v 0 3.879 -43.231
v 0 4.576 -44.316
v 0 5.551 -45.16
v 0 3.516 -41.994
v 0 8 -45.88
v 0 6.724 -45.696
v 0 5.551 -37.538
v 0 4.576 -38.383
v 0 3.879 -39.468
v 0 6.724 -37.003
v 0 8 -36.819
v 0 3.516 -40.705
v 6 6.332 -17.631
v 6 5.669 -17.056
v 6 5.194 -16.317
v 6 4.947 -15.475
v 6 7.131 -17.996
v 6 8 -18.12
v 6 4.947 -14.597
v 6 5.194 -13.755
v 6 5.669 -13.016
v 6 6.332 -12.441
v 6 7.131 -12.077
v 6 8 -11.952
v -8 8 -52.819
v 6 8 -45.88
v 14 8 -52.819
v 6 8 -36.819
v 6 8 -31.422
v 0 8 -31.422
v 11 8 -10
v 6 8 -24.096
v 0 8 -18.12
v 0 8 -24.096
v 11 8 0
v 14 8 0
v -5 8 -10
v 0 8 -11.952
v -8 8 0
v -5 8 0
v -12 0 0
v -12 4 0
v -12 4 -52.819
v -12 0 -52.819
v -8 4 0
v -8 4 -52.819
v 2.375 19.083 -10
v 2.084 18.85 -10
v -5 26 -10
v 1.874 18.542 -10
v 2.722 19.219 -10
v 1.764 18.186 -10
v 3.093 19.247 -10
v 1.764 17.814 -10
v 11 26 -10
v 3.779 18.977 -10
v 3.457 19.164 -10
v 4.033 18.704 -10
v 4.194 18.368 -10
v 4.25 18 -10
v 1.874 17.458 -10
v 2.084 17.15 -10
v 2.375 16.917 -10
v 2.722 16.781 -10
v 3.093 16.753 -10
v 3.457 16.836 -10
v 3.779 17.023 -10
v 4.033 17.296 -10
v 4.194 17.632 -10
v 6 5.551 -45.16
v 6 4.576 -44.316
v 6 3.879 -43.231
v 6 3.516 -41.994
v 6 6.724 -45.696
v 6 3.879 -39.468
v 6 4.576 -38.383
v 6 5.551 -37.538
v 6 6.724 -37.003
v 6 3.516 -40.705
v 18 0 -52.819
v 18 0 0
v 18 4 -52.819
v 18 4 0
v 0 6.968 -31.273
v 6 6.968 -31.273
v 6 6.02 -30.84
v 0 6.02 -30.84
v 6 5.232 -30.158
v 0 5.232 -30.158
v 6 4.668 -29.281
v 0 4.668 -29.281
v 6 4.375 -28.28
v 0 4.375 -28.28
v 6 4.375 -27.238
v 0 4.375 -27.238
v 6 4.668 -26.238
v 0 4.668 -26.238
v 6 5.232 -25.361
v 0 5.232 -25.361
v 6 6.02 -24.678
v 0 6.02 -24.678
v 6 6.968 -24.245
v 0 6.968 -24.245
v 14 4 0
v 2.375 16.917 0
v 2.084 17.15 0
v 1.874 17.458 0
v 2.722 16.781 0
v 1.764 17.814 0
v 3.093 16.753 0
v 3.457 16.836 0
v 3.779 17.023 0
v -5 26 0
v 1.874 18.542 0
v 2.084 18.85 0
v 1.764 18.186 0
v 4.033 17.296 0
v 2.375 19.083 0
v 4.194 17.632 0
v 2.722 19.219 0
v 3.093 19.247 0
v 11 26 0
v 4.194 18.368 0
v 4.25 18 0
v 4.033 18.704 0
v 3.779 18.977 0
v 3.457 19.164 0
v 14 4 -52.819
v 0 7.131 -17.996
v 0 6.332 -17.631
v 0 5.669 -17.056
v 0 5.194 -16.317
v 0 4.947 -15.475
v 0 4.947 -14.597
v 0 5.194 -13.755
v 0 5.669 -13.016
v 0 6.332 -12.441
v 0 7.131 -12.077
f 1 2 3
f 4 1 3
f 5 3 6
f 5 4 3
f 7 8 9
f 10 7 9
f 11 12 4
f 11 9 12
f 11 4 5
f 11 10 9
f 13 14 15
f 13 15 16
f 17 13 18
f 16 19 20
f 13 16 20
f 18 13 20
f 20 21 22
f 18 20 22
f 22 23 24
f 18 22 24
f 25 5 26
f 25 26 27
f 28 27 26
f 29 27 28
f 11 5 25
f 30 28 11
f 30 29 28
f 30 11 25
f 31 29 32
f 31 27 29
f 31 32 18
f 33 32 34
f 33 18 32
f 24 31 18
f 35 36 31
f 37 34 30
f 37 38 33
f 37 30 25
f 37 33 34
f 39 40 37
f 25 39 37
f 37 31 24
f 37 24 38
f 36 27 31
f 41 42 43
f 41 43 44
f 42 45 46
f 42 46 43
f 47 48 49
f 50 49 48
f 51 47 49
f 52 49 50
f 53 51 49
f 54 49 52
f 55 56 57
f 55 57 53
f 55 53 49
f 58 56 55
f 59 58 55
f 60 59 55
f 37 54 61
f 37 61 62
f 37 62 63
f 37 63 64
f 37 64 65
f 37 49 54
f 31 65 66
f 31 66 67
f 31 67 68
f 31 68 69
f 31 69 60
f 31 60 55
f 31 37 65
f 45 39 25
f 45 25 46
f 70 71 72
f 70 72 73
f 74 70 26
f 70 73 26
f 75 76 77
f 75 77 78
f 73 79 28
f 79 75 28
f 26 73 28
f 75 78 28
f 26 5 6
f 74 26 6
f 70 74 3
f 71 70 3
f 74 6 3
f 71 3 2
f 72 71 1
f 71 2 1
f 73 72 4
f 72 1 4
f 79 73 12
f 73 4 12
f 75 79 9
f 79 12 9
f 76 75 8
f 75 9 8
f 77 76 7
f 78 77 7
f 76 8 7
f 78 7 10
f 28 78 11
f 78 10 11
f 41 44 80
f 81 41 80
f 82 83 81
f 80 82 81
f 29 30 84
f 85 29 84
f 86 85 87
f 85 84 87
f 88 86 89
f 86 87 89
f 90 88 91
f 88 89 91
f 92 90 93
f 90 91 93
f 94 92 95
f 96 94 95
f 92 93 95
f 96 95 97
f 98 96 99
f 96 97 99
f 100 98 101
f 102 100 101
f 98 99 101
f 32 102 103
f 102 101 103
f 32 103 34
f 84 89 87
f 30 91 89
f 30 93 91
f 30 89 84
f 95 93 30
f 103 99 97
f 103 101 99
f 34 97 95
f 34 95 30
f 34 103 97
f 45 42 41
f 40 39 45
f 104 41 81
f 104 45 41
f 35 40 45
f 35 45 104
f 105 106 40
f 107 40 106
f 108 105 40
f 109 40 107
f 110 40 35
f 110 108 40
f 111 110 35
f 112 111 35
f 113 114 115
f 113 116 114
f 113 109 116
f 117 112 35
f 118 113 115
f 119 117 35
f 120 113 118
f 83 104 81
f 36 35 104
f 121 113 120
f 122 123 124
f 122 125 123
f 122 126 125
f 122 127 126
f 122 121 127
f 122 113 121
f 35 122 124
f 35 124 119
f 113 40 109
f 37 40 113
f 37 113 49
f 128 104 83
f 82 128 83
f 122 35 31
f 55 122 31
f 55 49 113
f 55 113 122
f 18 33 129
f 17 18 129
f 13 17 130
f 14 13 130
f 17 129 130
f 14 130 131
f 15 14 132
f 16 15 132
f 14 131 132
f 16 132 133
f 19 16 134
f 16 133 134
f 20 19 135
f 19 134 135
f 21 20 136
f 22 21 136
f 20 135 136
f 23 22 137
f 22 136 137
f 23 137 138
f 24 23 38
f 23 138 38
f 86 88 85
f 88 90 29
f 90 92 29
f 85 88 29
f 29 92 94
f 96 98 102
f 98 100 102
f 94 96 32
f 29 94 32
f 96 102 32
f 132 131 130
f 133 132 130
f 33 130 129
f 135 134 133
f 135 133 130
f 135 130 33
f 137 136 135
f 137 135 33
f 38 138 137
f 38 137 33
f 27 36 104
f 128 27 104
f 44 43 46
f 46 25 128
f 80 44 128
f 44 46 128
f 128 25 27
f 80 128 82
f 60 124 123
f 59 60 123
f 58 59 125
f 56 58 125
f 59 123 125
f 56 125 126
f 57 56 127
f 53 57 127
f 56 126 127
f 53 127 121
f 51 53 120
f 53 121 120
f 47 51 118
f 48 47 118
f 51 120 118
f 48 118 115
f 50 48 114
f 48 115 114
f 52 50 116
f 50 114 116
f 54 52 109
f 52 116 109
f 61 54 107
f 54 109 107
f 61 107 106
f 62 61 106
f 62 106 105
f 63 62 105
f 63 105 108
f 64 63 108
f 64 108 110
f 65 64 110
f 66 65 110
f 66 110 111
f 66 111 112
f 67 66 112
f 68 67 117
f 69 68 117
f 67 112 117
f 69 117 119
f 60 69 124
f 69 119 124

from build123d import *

# Parameters (mm, degrees)
EXTRUDE_1_DEPTH     = 6
EXTRUDE_2_DEPTH     = 52.819277108
EXTRUDE_3_DEPTH     = 52.819277108
SKETCH_6_W          = 16
SKETCH_6_H          = 10
EXTRUDE_5_DEPTH     = 18
SKETCH_7_R          = 1.25
CUT_EXTRUDE_2_DEPTH = 10


with BuildPart() as part:
    # Эскиз1 → Бобышка-Вытянуть1 (new body)
    with BuildSketch(Plane(origin=(0, 0, 0), x_dir=(0, 0, -1), z_dir=(1, 0, 0))):
        with BuildLine():
            Line((0, 0), (52.819277108, 0))
            Line((52.819277108, 0), (52.819277108, 8))
            Line((52.819277108, 8), (45.879518072, 8))
            ThreePointArc((45.879518072, 8), (41.34939759, 3.469879518), (36.819277108, 8))
            Line((36.819277108, 8), (31.421686747, 8))
            ThreePointArc((31.421686747, 8), (27.759036145, 4.337349398), (24.096385542, 8))
            Line((24.096385542, 8), (18.120481928, 8))
            ThreePointArc((18.120481928, 8), (15.036144578, 4.915662651), (11.951807229, 8))
            Line((11.951807229, 8), (0, 8))
            Line((0, 8), (0, 0))
        make_face()
    extrude(amount=EXTRUDE_1_DEPTH)

    # Эскиз2 → Бобышка-Вытянуть2 (add)
    with BuildSketch(Plane.XY):
        Polygon((6, 8), (14, 8), (14, 4), (18, 4), (18, 0), (6, 0), align=None)
    extrude(amount=-EXTRUDE_2_DEPTH)

    # Эскиз3 → Бобышка-Вытянуть3 (add)
    with BuildSketch(Plane.XY):
        Polygon((0, 8), (-8, 8), (-8, 4), (-12, 4), (-12, 0), (0, 0), align=None)
    extrude(amount=-EXTRUDE_3_DEPTH)

    # Эскиз6 → Бобышка-Вытянуть5 (add)
    with BuildSketch(Plane(origin=(0, 8, 0), x_dir=(1, 0, 0), z_dir=(0, 1, 0))):
        with Locations((3, 5)):
            Rectangle(SKETCH_6_W, SKETCH_6_H)
    extrude(amount=EXTRUDE_5_DEPTH)

    # Эскиз7 → Вырез-Вытянуть2 (cut)
    with BuildSketch(Plane.XY):
        with Locations((3, 18)):
            Circle(SKETCH_7_R)
    extrude(amount=-CUT_EXTRUDE_2_DEPTH, mode=Mode.SUBTRACT)


solid = part.part
